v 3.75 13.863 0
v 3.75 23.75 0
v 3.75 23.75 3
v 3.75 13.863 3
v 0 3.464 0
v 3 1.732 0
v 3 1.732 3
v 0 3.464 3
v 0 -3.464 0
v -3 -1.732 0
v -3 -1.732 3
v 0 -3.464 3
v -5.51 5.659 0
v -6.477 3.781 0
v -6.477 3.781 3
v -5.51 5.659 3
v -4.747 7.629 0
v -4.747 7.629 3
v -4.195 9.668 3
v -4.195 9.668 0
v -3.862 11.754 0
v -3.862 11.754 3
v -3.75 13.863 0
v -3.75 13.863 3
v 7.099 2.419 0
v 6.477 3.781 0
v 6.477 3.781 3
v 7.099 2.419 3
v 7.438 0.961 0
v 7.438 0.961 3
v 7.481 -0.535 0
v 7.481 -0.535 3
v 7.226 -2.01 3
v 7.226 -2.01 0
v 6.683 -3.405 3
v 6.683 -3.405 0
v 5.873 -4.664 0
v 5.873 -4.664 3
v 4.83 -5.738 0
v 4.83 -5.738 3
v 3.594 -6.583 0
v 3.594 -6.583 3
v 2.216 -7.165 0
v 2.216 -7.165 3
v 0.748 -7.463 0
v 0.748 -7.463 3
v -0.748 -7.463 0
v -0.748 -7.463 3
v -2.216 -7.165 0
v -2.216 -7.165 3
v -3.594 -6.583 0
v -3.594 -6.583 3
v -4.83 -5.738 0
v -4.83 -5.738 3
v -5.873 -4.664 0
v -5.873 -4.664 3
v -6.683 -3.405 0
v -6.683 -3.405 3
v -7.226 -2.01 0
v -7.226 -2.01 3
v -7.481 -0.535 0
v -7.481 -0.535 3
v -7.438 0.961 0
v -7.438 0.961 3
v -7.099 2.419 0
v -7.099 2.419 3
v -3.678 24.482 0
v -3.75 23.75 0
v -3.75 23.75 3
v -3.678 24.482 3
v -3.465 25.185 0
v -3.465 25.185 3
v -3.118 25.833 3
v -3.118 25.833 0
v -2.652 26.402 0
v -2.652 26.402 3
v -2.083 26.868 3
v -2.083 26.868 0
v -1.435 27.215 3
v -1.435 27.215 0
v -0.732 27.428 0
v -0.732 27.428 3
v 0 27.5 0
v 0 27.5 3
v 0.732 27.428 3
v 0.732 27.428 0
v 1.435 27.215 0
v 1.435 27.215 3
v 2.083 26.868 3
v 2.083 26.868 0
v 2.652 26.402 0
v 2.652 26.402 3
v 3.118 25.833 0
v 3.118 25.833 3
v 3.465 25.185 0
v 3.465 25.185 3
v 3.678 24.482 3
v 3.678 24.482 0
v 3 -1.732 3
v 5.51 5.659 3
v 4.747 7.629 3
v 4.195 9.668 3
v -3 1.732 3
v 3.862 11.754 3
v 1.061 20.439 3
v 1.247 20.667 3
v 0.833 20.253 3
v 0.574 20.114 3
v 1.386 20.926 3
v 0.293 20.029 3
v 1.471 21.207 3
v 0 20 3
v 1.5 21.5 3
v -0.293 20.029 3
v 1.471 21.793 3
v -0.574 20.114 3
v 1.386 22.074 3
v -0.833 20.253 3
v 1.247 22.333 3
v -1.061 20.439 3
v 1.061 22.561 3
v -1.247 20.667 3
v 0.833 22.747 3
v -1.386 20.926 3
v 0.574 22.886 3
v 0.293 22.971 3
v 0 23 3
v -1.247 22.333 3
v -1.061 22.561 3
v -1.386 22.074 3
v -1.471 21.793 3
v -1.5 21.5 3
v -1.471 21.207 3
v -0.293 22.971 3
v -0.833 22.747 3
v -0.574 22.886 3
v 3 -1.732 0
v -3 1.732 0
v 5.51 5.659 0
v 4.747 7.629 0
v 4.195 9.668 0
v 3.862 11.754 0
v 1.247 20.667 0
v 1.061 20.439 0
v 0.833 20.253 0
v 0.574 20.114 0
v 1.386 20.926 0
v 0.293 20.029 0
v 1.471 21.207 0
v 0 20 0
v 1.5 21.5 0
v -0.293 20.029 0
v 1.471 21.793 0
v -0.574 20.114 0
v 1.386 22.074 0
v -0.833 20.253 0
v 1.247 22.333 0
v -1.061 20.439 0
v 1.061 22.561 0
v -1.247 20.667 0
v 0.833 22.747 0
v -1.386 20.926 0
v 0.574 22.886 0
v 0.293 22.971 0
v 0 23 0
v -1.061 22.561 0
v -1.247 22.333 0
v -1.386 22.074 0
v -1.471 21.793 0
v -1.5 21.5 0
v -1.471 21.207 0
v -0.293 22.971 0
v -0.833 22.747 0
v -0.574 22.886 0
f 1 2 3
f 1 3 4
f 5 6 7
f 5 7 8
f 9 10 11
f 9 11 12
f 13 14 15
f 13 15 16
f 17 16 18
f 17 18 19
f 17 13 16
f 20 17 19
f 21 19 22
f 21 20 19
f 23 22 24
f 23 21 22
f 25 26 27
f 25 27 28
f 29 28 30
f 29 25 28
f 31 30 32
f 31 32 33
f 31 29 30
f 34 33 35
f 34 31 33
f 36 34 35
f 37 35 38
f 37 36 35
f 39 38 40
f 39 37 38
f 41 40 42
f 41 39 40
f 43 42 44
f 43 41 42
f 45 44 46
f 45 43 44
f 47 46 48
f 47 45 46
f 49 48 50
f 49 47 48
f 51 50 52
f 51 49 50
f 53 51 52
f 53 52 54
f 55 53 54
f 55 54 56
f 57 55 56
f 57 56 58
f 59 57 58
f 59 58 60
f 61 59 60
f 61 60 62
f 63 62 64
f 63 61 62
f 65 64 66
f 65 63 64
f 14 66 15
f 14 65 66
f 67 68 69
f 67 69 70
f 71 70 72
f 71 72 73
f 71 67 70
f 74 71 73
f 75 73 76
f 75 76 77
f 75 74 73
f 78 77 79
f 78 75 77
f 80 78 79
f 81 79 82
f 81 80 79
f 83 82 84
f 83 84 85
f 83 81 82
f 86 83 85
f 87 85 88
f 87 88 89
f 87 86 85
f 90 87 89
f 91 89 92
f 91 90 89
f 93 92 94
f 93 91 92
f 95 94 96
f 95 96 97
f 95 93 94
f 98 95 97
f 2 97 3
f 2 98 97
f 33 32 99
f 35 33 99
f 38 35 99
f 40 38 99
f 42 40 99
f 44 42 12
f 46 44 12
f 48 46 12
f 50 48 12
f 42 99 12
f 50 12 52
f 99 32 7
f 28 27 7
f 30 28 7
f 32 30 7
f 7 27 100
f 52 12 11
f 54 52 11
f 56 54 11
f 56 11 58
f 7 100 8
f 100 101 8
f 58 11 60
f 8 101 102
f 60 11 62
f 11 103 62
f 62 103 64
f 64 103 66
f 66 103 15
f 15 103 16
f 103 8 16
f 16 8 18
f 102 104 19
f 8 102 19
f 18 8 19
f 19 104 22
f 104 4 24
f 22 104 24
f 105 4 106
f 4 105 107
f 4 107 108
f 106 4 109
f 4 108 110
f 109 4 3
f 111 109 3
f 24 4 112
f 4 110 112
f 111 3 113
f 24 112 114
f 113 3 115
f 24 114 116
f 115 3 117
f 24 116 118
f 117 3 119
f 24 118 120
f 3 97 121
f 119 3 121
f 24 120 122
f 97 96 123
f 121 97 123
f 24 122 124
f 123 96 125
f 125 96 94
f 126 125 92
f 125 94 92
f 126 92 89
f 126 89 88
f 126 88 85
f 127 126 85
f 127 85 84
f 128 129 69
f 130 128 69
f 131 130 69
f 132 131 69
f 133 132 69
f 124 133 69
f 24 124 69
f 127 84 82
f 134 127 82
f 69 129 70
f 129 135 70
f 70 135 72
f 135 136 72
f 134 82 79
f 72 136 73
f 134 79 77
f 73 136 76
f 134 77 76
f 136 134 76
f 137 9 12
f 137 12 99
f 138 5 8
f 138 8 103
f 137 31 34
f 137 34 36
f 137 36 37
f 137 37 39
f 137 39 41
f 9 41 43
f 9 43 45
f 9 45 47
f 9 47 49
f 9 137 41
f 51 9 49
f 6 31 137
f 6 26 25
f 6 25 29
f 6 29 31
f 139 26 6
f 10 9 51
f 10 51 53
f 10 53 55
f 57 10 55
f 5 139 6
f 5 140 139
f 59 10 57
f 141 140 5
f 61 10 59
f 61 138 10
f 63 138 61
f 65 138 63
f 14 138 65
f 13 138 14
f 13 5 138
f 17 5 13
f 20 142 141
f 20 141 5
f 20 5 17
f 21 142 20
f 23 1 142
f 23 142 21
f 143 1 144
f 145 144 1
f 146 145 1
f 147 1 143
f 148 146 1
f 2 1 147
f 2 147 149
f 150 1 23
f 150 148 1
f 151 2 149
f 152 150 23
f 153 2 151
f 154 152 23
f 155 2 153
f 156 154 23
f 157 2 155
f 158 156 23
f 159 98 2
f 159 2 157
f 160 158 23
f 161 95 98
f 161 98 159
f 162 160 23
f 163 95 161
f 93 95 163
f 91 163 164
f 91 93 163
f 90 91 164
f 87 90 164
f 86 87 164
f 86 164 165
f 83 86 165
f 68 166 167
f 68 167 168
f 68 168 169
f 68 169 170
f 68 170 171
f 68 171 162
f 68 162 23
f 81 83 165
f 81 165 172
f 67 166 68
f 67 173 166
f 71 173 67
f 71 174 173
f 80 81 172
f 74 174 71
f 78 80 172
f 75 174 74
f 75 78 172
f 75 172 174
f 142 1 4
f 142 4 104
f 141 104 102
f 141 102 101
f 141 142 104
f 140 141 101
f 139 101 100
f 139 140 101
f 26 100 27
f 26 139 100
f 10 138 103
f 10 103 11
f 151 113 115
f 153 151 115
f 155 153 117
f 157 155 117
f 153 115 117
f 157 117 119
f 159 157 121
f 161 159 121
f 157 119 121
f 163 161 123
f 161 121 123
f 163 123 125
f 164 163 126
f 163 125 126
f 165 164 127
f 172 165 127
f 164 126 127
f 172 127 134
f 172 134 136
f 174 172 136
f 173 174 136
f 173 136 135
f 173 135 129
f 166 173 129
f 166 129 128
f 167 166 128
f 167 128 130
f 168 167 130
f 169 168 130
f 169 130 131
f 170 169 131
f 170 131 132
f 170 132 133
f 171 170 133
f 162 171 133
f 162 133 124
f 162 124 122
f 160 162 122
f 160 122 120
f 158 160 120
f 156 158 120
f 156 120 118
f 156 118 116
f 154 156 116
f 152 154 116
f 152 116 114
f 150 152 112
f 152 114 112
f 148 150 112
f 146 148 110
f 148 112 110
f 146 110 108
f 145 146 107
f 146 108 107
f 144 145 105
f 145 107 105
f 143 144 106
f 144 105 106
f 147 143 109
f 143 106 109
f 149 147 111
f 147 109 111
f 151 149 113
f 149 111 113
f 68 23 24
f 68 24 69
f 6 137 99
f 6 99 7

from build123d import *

# Parameters (mm, degrees)
BOSS_EXTRUDE1_DEPTH = 3
SKETCH3_R           = 1.5
CUT_EXTRUDE1_DEPTH  = 10


with BuildPart() as part:
    # Sketch1 → Boss-Extrude1 (new body)
    with BuildSketch(Plane.XY):
        with BuildLine():
            Line((-3.75, 13.863170633), (-3.75, 23.75))
            ThreePointArc((-3.75, 23.75), (0, 27.5), (3.75, 23.75))
            Line((3.75, 23.75), (3.75, 13.863170633))
            ThreePointArc((3.75, 13.863170633), (4.443854017, 8.640840954), (6.477272727, 3.780864718))
            ThreePointArc((6.477272727, 3.780864718), (0, -7.5), (-6.477272727, 3.780864718))
            ThreePointArc((-6.477272727, 3.780864718), (-4.443854017, 8.640840954), (-3.75, 13.863170633))
        make_face()
        Polygon((0, 3.464101615), (-3, 1.732050808), (-3, -1.732050808), (0, -3.464101615), (3, -1.732050808), (3, 1.732050808), align=None, mode=Mode.SUBTRACT)
    extrude(amount=BOSS_EXTRUDE1_DEPTH)

    # Sketch3 → Cut-Extrude1 (cut)
    with BuildSketch(Plane.XY.offset(3)):
        with Locations((0, 21.5)):
            Circle(SKETCH3_R)
    extrude(amount=-CUT_EXTRUDE1_DEPTH, mode=Mode.SUBTRACT)


solid = part.part
